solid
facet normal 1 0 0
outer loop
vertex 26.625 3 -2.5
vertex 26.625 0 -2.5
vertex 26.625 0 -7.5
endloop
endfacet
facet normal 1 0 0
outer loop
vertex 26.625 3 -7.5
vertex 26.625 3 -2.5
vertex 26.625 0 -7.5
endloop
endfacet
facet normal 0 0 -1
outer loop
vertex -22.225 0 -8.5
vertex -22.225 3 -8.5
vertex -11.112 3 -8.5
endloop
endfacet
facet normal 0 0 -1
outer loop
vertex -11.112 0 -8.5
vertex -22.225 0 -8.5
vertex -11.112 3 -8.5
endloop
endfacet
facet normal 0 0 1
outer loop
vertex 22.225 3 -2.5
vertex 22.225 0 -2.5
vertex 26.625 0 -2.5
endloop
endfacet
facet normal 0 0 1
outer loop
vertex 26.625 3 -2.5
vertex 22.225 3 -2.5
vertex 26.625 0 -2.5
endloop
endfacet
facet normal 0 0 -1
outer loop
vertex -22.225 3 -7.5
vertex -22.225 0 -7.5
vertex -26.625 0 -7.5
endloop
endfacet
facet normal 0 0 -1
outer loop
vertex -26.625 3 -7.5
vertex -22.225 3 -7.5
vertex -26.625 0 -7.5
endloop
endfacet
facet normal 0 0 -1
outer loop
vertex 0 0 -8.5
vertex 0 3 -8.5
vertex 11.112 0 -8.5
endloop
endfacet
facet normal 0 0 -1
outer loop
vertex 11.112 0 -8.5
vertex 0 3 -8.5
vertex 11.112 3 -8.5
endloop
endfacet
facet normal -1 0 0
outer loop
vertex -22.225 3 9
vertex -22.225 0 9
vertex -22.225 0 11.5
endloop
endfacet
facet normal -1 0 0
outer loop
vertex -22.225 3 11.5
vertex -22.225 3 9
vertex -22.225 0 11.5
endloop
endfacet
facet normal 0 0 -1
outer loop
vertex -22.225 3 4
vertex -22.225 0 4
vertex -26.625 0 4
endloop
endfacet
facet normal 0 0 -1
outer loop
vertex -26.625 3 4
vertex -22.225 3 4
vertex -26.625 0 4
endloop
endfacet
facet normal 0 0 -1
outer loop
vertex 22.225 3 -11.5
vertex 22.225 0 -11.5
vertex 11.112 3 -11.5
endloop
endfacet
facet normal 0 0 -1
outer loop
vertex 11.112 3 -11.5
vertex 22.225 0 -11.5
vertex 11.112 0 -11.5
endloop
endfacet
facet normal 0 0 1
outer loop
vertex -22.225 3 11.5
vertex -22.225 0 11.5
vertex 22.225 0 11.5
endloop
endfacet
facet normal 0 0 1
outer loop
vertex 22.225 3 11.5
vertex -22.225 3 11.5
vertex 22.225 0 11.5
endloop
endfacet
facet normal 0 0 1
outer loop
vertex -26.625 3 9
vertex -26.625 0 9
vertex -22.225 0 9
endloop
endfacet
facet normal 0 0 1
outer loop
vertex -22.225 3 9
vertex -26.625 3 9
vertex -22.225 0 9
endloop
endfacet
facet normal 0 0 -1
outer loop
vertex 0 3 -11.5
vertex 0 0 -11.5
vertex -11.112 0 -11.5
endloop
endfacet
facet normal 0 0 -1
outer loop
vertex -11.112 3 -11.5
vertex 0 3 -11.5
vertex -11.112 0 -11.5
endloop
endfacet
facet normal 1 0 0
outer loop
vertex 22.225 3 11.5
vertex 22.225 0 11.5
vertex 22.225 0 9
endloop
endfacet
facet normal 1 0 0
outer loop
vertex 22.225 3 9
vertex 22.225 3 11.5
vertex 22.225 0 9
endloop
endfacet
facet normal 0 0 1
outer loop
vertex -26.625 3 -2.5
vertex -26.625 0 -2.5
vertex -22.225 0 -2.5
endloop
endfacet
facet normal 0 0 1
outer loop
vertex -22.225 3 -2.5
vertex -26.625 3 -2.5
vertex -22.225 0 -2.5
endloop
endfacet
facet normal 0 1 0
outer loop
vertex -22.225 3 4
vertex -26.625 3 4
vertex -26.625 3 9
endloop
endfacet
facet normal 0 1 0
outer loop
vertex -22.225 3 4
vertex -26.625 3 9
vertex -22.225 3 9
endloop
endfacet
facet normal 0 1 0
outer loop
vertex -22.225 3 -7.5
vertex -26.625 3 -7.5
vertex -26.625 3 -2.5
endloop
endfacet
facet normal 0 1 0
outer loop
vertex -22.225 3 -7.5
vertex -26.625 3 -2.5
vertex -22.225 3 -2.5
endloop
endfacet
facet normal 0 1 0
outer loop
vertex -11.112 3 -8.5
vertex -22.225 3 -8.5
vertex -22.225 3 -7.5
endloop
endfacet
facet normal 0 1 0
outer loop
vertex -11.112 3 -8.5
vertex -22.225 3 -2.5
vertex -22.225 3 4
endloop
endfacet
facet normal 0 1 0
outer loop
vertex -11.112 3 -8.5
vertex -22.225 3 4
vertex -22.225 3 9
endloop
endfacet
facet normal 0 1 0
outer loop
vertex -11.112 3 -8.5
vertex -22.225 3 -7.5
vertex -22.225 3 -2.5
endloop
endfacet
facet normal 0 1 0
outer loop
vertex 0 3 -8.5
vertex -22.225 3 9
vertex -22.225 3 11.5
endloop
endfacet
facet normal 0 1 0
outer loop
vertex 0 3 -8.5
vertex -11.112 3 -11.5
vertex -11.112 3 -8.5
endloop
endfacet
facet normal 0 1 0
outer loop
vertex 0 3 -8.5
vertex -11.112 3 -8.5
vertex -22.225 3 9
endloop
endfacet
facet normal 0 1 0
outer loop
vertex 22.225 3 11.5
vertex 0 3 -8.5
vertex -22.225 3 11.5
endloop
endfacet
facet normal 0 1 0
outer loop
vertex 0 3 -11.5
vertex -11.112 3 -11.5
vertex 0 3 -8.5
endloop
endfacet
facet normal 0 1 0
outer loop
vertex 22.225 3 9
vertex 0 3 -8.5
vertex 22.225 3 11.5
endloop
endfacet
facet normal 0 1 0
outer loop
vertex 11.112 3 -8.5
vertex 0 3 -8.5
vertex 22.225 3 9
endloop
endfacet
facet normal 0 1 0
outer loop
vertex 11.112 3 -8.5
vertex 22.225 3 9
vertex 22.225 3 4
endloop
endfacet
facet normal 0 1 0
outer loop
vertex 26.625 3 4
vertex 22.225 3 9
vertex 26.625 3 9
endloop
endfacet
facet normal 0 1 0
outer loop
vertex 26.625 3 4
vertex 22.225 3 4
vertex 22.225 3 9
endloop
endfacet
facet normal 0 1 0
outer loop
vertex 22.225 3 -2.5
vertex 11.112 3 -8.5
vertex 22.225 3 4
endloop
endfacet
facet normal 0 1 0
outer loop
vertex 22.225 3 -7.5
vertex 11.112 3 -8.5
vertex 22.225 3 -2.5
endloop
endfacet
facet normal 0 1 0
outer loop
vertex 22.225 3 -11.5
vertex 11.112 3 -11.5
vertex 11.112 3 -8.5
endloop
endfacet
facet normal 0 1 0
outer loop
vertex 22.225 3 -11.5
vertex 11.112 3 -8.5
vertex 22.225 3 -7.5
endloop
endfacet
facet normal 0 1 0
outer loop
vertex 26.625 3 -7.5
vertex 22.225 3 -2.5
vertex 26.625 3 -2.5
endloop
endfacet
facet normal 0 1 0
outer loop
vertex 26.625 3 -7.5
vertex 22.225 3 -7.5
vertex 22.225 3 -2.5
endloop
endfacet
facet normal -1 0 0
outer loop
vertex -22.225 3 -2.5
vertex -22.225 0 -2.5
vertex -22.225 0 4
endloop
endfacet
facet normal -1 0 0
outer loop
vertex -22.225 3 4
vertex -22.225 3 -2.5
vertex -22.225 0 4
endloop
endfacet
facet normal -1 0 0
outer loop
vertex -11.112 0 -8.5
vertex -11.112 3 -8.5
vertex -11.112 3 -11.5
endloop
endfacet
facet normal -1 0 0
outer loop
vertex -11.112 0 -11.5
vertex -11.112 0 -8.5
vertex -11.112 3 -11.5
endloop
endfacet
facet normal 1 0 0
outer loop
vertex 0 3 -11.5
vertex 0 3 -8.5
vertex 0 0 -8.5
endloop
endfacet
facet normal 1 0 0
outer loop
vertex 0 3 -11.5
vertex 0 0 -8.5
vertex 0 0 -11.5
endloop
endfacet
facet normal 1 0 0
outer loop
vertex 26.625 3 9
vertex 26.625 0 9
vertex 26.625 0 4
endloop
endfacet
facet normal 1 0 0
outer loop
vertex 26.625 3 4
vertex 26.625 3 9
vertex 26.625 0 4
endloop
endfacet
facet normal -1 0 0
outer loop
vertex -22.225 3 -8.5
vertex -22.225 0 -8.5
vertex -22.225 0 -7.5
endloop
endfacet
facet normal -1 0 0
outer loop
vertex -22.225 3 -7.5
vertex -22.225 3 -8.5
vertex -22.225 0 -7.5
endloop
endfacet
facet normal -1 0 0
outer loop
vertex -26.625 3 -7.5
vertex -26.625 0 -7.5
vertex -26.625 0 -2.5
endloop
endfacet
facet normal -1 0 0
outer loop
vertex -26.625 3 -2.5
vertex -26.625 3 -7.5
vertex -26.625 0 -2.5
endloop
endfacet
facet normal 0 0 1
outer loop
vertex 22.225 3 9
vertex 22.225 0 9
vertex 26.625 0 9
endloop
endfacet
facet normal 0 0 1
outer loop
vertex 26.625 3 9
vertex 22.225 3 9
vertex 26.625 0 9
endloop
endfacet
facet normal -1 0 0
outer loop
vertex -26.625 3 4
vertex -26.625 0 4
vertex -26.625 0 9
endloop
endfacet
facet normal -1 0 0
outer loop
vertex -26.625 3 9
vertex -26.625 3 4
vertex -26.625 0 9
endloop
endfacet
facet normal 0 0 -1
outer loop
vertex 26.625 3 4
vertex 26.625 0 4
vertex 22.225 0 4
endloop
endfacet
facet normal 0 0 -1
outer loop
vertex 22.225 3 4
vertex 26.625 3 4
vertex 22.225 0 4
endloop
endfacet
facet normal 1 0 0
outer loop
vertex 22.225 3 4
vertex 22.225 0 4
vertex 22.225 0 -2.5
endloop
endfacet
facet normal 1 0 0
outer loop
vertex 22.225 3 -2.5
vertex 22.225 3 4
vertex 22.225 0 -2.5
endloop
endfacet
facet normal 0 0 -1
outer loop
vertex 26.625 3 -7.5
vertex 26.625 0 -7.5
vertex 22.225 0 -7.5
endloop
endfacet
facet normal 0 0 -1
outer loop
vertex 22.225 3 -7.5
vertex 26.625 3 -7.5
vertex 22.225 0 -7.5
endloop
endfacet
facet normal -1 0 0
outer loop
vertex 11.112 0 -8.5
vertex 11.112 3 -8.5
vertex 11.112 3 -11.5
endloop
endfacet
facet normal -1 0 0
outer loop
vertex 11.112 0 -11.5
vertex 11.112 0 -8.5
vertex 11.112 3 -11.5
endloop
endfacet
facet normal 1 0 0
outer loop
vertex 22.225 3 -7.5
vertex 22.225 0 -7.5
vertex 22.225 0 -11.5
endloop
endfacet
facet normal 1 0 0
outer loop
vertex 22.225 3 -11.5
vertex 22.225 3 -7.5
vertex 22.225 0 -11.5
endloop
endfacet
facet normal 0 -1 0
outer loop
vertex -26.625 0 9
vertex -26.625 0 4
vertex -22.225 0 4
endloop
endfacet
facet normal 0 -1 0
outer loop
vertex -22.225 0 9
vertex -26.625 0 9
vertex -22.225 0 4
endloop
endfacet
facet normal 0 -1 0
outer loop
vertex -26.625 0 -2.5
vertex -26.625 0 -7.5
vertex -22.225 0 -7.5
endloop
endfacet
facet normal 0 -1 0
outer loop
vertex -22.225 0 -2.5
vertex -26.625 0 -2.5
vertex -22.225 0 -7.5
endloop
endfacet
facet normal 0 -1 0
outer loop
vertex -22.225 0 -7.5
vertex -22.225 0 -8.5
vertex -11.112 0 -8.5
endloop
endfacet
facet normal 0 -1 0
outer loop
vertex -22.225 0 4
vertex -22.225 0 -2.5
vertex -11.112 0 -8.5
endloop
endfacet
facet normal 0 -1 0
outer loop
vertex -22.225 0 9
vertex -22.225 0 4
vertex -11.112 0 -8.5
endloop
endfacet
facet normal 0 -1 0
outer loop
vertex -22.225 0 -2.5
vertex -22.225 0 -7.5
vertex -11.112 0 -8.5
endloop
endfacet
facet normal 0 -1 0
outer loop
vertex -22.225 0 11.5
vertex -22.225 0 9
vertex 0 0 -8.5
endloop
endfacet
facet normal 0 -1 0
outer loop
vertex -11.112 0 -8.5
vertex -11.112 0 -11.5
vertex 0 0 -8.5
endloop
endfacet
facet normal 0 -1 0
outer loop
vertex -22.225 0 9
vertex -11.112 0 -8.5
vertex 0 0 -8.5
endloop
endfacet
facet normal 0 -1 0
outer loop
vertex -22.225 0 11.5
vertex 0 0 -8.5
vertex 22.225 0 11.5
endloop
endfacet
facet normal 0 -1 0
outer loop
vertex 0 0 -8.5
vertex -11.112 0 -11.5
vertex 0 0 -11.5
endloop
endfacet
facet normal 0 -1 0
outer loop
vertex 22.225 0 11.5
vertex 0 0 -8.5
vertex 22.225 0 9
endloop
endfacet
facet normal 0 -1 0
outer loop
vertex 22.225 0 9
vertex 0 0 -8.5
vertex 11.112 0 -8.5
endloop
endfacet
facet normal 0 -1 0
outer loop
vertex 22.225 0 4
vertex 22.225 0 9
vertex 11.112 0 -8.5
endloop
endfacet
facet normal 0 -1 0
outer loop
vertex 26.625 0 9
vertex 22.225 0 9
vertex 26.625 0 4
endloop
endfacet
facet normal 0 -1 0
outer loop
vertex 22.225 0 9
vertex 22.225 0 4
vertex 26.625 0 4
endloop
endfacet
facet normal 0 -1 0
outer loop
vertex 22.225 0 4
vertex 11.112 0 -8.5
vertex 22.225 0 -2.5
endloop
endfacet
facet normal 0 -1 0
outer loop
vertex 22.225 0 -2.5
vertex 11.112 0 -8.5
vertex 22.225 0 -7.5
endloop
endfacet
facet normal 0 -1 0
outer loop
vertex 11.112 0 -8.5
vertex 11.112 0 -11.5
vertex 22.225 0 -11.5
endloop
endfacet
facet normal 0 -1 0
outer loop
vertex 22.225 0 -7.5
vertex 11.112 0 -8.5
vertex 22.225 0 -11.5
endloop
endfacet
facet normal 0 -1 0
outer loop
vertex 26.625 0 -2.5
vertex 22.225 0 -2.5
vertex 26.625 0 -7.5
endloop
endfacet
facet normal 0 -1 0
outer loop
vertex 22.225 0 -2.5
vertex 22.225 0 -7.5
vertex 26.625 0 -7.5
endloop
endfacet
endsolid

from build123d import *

# Parameters (mm, degrees)
BOSS_EXTRUDE1_DEPTH = 3
SKETCH2_W           = 11.1125
SKETCH2_H           = 3
CUT_EXTRUDE1_DEPTH  = 4


with BuildPart() as part:
    # Sketch1 → Boss-Extrude1 (new body)
    with BuildSketch(Plane(origin=(0, 0, 0), x_dir=(1, 0, 0), z_dir=(0, 1, 0))):
        Polygon((-22.225, -11.5), (22.225, -11.5), (22.225, -9), (26.625, -9), (26.625, -4), (22.225, -4), (22.225, 2.5), (26.625, 2.5), (26.625, 7.5), (22.225, 7.5), (22.225, 11.5), (-22.225, 11.5), (-22.225, 7.5), (-26.625, 7.5), (-26.625, 2.5), (-22.225, 2.5), (-22.225, -4), (-26.625, -4), (-26.625, -9), (-22.225, -9), align=None)
    extrude(amount=BOSS_EXTRUDE1_DEPTH)

    # Sketch2 → Cut-Extrude1 (cut, through all)
    with BuildSketch(Plane(origin=(0, 3, 0), x_dir=(1, 0, 0), z_dir=(0, 1, 0))):
        with Locations((-16.66875, 10)):
            Rectangle(SKETCH2_W, SKETCH2_H)
        with Locations((5.55625, 10)):
            Rectangle(SKETCH2_W, SKETCH2_H)
    extrude(amount=-CUT_EXTRUDE1_DEPTH, mode=Mode.SUBTRACT)


solid = part.part
